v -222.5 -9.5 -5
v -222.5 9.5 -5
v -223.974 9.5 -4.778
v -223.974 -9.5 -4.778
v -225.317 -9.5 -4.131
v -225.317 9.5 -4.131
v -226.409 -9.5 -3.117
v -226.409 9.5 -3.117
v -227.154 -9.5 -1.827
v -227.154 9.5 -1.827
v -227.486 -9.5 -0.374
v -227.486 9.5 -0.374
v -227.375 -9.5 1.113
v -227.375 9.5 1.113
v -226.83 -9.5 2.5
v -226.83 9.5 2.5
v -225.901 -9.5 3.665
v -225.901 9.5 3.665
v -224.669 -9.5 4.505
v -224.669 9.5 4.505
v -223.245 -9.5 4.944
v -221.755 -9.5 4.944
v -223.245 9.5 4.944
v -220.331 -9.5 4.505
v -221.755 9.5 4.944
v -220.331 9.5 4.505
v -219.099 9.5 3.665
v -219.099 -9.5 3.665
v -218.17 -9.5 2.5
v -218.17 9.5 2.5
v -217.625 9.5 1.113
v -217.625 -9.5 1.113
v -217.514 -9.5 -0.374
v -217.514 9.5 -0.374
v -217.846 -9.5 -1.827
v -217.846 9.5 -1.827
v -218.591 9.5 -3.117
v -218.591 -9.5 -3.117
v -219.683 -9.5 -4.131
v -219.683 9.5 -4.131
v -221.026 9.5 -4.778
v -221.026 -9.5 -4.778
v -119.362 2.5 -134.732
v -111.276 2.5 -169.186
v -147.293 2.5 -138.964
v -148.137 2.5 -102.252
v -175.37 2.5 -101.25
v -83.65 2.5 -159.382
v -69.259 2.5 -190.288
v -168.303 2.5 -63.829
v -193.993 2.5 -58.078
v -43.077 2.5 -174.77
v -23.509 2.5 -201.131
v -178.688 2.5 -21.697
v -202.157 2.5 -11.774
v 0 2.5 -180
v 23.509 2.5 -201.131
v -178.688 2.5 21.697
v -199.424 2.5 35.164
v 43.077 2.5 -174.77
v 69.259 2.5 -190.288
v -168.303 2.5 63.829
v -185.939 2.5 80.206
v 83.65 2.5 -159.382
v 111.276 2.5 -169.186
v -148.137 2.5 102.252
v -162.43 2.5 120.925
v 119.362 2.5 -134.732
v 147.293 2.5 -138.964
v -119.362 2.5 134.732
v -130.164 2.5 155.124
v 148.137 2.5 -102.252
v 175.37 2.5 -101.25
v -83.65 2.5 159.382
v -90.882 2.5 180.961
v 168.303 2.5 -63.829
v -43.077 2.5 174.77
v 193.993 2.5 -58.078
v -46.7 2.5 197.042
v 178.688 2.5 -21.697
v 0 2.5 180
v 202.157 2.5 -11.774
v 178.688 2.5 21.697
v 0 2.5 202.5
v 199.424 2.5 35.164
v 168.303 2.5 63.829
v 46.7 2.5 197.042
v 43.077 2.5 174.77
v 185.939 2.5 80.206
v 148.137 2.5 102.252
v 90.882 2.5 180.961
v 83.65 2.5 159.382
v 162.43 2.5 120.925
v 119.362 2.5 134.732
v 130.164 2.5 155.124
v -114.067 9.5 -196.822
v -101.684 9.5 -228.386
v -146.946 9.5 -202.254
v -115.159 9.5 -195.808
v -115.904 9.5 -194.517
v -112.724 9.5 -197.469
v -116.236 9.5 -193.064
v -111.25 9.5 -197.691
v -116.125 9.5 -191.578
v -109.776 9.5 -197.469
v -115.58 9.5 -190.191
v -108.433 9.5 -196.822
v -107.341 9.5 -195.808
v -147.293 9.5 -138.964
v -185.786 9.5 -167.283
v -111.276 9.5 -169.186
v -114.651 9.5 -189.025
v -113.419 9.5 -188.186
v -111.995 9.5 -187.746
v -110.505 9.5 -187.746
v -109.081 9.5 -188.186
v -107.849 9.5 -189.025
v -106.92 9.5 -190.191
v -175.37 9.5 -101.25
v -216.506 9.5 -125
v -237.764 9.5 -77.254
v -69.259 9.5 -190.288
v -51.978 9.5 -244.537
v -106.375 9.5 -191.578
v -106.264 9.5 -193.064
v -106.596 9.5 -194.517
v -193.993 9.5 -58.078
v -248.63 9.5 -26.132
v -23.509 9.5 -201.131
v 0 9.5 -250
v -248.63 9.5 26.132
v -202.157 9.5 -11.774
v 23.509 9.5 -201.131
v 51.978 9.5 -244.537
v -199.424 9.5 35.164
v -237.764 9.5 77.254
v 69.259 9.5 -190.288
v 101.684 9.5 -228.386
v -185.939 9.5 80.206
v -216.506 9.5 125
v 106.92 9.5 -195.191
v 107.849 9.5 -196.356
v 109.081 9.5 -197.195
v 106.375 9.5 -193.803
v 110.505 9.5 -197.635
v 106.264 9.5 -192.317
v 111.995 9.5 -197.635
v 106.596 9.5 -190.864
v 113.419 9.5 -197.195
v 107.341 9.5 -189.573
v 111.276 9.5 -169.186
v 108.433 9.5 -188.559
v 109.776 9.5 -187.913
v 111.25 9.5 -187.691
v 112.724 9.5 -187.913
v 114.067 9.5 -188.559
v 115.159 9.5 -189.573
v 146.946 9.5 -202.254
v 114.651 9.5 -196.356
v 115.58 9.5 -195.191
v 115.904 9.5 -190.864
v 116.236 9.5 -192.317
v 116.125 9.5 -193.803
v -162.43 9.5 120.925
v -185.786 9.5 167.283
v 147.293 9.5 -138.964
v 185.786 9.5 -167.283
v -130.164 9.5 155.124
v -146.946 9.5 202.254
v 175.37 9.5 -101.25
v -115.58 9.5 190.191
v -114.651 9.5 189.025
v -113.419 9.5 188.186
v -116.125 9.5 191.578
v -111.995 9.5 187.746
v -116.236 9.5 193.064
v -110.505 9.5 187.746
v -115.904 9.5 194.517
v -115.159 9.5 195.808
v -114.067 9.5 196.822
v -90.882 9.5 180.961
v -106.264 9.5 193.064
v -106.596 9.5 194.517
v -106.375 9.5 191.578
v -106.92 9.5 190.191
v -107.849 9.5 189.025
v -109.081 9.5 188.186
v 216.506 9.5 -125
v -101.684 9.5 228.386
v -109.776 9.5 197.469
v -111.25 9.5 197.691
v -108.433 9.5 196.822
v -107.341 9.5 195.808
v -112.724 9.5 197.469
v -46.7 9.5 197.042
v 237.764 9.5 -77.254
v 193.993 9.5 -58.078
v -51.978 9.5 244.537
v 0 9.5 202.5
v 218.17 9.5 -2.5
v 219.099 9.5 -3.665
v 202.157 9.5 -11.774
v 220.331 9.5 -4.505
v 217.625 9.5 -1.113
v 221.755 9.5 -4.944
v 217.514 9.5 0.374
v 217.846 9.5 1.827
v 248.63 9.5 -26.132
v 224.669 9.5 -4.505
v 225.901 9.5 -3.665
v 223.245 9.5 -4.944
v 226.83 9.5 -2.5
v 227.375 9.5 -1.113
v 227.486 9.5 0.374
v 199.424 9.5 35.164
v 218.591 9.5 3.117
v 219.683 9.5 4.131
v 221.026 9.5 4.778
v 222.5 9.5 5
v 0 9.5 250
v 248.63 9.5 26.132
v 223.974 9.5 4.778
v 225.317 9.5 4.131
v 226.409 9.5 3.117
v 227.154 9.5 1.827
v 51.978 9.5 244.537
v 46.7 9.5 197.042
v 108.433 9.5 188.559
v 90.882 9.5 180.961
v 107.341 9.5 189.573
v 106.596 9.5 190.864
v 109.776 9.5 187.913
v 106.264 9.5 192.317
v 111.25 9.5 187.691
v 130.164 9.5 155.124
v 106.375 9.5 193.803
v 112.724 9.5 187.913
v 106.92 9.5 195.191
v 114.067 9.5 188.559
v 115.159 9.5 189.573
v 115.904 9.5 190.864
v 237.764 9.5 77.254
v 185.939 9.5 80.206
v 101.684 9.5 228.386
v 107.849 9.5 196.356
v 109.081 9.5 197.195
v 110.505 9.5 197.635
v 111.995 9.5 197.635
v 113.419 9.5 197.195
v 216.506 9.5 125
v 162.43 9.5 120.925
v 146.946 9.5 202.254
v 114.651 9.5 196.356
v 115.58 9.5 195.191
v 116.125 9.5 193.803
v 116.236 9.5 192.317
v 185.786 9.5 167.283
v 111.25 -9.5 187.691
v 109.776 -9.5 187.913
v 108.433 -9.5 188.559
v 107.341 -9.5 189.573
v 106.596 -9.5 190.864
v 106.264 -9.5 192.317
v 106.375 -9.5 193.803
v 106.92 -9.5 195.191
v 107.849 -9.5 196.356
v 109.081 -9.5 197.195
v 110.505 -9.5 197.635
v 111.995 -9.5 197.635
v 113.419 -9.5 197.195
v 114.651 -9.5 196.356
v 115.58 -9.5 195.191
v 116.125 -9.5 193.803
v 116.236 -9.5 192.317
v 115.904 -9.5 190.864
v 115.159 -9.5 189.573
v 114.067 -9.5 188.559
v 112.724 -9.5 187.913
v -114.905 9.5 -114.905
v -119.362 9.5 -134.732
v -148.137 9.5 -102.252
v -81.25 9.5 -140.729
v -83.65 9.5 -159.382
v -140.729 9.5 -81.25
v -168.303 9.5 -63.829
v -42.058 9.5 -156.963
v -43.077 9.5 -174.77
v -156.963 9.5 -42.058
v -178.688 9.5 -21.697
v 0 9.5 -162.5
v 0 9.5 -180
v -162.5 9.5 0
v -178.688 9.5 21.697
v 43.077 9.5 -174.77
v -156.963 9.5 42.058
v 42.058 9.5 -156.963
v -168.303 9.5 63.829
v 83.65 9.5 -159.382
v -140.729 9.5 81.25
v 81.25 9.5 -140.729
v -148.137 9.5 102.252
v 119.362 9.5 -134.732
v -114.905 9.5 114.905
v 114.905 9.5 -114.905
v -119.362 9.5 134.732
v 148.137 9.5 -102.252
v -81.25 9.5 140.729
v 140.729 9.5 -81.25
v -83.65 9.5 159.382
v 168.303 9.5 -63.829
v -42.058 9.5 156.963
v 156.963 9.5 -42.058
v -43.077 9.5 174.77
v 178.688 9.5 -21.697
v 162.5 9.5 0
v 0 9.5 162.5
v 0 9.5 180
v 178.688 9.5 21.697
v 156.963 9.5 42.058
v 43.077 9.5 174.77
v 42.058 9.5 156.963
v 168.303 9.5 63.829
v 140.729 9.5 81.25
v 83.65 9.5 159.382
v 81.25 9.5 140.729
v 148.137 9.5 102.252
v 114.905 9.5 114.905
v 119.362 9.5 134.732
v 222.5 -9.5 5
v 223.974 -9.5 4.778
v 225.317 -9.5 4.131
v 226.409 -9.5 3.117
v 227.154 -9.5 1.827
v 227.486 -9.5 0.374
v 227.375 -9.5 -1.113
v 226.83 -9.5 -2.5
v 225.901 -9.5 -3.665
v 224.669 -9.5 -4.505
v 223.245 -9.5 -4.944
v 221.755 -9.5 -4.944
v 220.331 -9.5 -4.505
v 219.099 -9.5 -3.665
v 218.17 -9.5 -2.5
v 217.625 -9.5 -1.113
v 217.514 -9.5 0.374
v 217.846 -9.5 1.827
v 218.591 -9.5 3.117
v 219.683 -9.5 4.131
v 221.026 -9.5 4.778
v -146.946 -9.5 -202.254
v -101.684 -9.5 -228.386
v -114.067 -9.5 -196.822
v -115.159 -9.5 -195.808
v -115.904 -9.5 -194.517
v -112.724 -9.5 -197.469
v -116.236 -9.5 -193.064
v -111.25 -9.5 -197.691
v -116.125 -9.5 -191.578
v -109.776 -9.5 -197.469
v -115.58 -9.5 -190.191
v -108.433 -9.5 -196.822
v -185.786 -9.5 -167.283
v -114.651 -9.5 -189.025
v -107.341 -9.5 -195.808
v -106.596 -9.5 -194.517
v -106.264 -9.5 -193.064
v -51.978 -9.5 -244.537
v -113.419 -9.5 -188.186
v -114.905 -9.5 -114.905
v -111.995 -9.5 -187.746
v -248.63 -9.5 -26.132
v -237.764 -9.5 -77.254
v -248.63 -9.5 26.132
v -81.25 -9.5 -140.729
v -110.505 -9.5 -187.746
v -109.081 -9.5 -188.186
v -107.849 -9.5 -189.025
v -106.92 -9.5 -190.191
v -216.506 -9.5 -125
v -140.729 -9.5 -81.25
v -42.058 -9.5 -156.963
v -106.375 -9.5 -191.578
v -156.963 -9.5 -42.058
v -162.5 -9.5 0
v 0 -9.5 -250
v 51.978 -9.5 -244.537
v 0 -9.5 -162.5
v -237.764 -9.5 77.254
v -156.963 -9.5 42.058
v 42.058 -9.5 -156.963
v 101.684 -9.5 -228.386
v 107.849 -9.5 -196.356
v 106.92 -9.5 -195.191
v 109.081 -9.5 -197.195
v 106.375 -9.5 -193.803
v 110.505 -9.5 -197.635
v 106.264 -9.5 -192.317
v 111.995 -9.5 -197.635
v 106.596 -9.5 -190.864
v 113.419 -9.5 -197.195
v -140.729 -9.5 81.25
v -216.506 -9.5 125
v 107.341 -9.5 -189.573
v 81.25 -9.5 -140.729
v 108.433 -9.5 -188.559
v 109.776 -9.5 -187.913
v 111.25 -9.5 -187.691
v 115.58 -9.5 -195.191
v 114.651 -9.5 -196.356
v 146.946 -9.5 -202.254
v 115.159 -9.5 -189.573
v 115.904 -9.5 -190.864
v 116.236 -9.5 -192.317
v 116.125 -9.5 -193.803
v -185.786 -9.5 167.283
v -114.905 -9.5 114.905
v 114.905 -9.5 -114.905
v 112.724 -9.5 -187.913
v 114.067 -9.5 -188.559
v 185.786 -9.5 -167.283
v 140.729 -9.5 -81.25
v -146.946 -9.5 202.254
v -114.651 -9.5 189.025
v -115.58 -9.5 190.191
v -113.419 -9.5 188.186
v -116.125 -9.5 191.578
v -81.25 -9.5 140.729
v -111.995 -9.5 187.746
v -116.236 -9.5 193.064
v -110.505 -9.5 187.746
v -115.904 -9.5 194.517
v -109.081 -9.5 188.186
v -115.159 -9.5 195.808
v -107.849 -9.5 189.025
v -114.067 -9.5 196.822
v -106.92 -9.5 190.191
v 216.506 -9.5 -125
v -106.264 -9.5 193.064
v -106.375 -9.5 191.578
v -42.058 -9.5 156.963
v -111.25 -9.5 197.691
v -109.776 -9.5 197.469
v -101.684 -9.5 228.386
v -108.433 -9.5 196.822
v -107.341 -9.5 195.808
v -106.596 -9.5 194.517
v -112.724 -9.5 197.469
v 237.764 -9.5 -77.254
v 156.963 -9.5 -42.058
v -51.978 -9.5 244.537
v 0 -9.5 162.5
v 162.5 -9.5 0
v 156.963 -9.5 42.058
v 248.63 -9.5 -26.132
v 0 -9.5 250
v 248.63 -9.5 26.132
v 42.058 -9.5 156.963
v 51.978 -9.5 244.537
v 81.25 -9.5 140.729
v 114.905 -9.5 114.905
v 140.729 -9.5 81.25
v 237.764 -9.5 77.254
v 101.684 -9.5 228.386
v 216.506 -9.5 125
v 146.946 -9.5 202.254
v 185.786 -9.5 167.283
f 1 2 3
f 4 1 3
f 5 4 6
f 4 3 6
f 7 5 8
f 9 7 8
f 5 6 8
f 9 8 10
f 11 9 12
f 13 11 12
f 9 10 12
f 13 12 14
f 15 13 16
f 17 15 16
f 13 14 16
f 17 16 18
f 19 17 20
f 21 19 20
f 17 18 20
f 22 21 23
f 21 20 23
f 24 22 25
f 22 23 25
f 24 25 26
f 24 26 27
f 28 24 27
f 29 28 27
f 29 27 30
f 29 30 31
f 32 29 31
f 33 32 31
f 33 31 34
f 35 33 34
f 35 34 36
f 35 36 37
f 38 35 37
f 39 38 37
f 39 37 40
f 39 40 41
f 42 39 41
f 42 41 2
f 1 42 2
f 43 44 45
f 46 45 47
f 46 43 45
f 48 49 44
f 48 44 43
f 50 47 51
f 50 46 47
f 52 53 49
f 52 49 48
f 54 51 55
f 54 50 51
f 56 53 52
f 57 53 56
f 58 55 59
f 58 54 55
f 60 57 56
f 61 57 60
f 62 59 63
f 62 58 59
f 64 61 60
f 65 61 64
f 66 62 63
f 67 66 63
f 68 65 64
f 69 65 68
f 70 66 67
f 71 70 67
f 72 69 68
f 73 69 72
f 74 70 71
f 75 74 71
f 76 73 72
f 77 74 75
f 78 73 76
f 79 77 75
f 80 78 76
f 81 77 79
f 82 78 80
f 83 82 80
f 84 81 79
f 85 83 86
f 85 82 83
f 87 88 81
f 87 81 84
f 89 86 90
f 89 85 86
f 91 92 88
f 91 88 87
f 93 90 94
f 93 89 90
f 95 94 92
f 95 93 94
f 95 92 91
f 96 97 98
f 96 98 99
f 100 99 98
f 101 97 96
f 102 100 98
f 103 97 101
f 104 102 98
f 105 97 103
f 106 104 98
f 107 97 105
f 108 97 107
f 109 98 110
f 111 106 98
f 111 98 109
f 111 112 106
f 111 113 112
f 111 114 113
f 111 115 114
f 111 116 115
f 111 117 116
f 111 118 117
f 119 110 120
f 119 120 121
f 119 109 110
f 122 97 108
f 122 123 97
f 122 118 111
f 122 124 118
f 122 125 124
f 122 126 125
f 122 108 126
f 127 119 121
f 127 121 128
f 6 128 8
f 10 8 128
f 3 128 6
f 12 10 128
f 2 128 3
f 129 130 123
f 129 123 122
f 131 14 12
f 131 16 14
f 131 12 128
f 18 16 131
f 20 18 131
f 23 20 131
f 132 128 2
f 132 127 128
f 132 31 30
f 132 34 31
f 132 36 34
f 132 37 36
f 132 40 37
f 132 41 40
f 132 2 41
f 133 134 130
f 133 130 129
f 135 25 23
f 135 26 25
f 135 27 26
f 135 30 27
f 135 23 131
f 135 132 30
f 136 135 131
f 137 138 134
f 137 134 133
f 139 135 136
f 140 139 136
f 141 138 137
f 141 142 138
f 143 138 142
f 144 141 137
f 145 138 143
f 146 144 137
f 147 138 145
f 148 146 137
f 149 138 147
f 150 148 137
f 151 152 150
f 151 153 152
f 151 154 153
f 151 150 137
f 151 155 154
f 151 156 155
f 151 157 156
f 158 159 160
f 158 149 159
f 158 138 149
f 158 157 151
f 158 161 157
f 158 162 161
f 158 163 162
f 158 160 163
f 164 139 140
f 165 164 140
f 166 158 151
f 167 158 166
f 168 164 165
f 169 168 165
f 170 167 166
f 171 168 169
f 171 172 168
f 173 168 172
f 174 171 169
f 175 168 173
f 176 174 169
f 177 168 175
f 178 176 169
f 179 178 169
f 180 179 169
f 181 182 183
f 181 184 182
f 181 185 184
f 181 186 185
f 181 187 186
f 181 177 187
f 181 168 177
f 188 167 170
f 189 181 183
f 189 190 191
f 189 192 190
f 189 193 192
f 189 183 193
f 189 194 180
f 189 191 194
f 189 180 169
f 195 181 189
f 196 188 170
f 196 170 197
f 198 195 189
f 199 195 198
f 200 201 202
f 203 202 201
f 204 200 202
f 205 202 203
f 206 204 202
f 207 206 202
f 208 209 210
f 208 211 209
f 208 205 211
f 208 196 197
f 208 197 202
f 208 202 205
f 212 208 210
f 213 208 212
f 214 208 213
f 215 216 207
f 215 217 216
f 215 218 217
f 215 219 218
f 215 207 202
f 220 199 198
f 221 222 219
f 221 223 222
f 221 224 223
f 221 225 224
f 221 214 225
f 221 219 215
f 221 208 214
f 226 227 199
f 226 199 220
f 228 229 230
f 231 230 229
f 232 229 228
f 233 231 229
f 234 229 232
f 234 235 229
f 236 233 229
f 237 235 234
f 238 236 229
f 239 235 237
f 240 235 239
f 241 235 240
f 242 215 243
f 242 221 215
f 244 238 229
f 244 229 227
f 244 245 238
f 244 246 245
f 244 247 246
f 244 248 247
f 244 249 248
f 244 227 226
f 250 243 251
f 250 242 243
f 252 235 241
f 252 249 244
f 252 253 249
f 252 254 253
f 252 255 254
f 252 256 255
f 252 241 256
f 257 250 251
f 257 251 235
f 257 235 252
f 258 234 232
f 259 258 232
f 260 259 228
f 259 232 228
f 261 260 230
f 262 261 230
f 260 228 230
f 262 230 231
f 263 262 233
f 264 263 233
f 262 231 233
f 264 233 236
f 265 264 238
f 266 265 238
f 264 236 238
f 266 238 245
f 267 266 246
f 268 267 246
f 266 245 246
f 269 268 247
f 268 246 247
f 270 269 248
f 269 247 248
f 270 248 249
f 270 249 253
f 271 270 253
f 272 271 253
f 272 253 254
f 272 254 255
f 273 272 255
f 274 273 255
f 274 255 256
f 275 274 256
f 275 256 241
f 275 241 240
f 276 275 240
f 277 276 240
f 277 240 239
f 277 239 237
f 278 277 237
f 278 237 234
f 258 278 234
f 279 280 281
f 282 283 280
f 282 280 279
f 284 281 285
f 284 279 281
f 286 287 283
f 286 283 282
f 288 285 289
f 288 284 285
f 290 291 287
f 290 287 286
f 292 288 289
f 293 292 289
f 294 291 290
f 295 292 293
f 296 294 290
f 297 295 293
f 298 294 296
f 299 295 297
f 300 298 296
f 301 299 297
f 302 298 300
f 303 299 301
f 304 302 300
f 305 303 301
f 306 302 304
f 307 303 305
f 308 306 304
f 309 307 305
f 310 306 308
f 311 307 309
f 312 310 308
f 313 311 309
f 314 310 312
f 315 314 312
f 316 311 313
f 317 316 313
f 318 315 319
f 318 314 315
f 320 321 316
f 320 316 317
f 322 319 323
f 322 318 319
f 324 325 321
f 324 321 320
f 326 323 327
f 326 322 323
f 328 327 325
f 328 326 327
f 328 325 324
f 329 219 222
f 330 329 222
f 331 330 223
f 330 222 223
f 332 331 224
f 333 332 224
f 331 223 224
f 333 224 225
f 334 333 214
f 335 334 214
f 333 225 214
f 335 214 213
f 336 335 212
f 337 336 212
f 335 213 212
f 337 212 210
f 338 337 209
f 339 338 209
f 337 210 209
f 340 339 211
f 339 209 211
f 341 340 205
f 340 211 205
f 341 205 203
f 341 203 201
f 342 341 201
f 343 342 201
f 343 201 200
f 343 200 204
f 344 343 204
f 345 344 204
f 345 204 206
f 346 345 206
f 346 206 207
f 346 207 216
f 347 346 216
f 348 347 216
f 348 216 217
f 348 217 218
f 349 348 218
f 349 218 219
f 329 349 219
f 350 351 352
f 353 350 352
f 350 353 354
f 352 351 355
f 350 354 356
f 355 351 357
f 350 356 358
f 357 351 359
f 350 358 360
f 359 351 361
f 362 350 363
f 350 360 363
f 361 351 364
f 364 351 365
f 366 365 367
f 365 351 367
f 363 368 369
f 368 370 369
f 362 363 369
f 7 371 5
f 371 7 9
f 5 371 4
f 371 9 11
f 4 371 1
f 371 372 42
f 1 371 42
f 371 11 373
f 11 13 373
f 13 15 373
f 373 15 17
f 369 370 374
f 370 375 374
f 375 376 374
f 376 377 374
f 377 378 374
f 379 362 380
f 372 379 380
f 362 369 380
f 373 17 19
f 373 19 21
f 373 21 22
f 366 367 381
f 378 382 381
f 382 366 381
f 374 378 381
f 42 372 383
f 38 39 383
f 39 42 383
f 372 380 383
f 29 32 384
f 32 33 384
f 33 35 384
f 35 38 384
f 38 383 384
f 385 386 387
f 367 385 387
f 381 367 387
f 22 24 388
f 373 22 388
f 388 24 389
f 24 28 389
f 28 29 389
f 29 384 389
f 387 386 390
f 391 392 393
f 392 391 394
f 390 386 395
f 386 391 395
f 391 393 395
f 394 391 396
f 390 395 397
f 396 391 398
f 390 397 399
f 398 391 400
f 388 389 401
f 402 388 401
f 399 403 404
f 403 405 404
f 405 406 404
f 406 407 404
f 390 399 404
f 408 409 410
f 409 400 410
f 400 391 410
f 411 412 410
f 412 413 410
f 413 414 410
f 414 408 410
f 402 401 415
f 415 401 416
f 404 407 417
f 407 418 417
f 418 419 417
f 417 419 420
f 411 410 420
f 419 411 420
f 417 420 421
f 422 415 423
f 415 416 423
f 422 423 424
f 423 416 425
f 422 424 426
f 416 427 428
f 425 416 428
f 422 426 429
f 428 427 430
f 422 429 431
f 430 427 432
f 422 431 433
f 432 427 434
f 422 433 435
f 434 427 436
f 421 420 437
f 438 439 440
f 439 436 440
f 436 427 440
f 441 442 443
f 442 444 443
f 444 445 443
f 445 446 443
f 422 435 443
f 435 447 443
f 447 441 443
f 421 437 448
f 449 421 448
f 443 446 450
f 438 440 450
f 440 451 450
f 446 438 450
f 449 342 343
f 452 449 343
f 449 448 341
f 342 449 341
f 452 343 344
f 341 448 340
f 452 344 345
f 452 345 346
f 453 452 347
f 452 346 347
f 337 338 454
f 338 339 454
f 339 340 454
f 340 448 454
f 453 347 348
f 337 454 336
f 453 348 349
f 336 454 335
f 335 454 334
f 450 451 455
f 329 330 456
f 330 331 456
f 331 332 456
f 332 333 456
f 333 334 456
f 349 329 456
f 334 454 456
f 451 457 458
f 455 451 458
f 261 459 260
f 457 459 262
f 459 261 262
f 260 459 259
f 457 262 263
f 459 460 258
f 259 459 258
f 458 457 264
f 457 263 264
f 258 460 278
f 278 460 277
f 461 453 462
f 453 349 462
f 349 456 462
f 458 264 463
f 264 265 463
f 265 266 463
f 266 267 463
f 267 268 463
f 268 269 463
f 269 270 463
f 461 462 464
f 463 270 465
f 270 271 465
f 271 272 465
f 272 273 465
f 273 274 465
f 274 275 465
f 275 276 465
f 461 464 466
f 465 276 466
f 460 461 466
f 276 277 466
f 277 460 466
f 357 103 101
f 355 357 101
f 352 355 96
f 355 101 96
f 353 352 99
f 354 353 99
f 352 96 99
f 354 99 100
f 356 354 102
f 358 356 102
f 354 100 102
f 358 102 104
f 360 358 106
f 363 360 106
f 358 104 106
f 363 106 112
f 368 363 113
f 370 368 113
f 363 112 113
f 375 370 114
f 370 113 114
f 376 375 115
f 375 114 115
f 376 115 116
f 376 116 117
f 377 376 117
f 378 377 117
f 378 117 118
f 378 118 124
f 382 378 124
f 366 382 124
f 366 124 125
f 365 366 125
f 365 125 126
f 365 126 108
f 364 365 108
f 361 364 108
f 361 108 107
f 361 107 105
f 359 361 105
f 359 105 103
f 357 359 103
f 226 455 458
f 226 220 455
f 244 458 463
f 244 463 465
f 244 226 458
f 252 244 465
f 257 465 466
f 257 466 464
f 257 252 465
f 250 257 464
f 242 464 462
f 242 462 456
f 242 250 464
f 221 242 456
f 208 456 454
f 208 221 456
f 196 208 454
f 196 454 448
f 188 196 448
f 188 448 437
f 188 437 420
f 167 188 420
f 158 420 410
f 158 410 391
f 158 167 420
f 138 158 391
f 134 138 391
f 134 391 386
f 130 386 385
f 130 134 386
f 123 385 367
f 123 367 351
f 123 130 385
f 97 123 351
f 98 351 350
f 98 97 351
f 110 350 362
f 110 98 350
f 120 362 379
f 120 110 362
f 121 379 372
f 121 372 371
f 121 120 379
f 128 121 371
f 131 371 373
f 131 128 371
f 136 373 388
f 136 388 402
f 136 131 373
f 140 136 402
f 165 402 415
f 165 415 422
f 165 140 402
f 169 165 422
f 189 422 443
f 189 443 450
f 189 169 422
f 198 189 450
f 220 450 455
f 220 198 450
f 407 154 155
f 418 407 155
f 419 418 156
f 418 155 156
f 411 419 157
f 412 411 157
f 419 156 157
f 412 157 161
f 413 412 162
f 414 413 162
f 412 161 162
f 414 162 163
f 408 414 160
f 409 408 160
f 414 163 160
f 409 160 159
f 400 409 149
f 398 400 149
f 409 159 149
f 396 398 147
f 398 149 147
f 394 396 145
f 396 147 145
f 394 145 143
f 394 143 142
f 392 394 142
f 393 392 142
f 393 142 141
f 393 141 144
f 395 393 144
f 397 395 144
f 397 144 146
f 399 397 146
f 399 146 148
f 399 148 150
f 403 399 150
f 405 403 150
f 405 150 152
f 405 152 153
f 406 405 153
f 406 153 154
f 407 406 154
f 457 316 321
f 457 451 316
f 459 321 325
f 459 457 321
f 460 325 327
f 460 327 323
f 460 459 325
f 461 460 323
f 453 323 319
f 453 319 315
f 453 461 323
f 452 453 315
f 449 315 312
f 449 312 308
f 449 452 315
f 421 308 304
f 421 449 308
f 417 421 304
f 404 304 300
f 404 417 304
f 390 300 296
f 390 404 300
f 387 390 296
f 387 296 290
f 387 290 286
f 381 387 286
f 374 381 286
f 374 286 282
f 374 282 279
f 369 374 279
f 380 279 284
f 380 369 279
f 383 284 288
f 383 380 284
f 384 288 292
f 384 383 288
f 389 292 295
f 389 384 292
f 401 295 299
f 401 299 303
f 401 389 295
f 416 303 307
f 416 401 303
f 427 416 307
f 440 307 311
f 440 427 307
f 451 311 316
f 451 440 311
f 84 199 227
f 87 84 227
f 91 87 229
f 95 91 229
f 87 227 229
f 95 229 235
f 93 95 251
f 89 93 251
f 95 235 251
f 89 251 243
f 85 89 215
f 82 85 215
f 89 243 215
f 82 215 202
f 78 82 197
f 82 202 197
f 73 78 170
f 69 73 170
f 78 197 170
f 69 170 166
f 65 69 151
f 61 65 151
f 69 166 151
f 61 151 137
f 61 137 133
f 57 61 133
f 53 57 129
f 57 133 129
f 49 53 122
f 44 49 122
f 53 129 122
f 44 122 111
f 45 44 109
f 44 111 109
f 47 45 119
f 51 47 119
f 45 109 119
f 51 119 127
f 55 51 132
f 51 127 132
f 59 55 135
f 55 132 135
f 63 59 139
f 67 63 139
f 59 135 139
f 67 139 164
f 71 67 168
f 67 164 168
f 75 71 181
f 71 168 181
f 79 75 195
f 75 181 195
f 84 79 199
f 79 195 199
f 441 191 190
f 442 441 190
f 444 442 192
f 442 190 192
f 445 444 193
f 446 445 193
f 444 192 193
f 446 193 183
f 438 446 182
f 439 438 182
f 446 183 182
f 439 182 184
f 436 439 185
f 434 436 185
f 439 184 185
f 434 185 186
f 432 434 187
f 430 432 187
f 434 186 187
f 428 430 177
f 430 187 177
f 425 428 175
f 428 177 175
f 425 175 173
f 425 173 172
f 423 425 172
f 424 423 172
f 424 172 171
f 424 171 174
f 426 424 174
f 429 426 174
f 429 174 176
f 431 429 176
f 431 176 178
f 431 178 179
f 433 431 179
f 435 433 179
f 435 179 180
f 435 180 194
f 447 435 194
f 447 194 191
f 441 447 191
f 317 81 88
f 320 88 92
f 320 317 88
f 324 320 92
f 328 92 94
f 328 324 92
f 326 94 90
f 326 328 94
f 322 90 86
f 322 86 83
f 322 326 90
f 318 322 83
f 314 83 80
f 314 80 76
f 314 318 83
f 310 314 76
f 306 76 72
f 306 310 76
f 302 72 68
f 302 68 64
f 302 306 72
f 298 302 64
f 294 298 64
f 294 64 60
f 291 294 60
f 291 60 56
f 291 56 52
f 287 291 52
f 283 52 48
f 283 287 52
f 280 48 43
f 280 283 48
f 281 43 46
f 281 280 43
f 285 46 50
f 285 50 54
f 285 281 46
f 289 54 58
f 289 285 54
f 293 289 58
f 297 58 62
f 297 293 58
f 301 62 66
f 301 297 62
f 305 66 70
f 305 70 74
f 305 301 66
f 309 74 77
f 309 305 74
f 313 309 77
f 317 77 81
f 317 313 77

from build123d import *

# Parameters (mm, degrees)
SKETCH1_R           = 250
SKETCH1_R_2         = 162.5
BOSS_EXTRUDE1_DEPTH = 9.5
SKETCH2_R           = 202.5
SKETCH2_R_2         = 180
CUT_EXTRUDE1_DEPTH  = 7
SKETCH3_R           = 5
CUT_EXTRUDE2_DEPTH  = 355.063553617


with BuildPart() as part:
    # Sketch1 → Boss-Extrude1 (new, symmetric)
    with BuildSketch(Plane(origin=(0, 0, 0), x_dir=(1, 0, 0), z_dir=(0, 1, 0))):
        with Locations(Location((0, 0, 0), (0, 0, 270))):
            Circle(SKETCH1_R)
        with Locations(Location((0, 0, 0), (0, 0, 270))):
            Circle(SKETCH1_R_2, mode=Mode.SUBTRACT)
    extrude(amount=BOSS_EXTRUDE1_DEPTH, both=True)

    # Sketch2 → Cut-Extrude1 (cut)
    with BuildSketch(Plane(origin=(0, 9.5, 0), x_dir=(1, 0, 0), z_dir=(0, 1, 0))):
        with Locations(Location((0, 0, 0), (0, 0, 270))):
            Circle(SKETCH2_R)
        with Locations(Location((0, 0, 0), (0, 0, 270))):
            Circle(SKETCH2_R_2, mode=Mode.SUBTRACT)
    extrude(amount=-CUT_EXTRUDE1_DEPTH, mode=Mode.SUBTRACT)

    # Sketch3 → Cut-Extrude2 (cut, through all)
    with BuildSketch(Plane(origin=(0, 9.5, 0), x_dir=(1, 0, 0), z_dir=(0, 1, 0))):
        with Locations(Location((111.25, 192.690652342, 0), (0, 0, 270))):
            Circle(SKETCH3_R)
        with Locations(Location((222.5, 0, 0), (0, 0, 270))):
            Circle(SKETCH3_R)
        with Locations(Location((-222.5, 0, 0), (0, 0, 90))):
            Circle(SKETCH3_R)
        with Locations(Location((-111.25, 192.690652342, 0), (0, 0, 90))):
            Circle(SKETCH3_R)
        with Locations(Location((111.25, -192.690652342, 0), (0, 0, 90))):
            Circle(SKETCH3_R)
        with Locations(Location((-111.25, -192.690652342, 0), (0, 0, 270))):
            Circle(SKETCH3_R)
    extrude(amount=-CUT_EXTRUDE2_DEPTH, mode=Mode.SUBTRACT)


solid = part.part
